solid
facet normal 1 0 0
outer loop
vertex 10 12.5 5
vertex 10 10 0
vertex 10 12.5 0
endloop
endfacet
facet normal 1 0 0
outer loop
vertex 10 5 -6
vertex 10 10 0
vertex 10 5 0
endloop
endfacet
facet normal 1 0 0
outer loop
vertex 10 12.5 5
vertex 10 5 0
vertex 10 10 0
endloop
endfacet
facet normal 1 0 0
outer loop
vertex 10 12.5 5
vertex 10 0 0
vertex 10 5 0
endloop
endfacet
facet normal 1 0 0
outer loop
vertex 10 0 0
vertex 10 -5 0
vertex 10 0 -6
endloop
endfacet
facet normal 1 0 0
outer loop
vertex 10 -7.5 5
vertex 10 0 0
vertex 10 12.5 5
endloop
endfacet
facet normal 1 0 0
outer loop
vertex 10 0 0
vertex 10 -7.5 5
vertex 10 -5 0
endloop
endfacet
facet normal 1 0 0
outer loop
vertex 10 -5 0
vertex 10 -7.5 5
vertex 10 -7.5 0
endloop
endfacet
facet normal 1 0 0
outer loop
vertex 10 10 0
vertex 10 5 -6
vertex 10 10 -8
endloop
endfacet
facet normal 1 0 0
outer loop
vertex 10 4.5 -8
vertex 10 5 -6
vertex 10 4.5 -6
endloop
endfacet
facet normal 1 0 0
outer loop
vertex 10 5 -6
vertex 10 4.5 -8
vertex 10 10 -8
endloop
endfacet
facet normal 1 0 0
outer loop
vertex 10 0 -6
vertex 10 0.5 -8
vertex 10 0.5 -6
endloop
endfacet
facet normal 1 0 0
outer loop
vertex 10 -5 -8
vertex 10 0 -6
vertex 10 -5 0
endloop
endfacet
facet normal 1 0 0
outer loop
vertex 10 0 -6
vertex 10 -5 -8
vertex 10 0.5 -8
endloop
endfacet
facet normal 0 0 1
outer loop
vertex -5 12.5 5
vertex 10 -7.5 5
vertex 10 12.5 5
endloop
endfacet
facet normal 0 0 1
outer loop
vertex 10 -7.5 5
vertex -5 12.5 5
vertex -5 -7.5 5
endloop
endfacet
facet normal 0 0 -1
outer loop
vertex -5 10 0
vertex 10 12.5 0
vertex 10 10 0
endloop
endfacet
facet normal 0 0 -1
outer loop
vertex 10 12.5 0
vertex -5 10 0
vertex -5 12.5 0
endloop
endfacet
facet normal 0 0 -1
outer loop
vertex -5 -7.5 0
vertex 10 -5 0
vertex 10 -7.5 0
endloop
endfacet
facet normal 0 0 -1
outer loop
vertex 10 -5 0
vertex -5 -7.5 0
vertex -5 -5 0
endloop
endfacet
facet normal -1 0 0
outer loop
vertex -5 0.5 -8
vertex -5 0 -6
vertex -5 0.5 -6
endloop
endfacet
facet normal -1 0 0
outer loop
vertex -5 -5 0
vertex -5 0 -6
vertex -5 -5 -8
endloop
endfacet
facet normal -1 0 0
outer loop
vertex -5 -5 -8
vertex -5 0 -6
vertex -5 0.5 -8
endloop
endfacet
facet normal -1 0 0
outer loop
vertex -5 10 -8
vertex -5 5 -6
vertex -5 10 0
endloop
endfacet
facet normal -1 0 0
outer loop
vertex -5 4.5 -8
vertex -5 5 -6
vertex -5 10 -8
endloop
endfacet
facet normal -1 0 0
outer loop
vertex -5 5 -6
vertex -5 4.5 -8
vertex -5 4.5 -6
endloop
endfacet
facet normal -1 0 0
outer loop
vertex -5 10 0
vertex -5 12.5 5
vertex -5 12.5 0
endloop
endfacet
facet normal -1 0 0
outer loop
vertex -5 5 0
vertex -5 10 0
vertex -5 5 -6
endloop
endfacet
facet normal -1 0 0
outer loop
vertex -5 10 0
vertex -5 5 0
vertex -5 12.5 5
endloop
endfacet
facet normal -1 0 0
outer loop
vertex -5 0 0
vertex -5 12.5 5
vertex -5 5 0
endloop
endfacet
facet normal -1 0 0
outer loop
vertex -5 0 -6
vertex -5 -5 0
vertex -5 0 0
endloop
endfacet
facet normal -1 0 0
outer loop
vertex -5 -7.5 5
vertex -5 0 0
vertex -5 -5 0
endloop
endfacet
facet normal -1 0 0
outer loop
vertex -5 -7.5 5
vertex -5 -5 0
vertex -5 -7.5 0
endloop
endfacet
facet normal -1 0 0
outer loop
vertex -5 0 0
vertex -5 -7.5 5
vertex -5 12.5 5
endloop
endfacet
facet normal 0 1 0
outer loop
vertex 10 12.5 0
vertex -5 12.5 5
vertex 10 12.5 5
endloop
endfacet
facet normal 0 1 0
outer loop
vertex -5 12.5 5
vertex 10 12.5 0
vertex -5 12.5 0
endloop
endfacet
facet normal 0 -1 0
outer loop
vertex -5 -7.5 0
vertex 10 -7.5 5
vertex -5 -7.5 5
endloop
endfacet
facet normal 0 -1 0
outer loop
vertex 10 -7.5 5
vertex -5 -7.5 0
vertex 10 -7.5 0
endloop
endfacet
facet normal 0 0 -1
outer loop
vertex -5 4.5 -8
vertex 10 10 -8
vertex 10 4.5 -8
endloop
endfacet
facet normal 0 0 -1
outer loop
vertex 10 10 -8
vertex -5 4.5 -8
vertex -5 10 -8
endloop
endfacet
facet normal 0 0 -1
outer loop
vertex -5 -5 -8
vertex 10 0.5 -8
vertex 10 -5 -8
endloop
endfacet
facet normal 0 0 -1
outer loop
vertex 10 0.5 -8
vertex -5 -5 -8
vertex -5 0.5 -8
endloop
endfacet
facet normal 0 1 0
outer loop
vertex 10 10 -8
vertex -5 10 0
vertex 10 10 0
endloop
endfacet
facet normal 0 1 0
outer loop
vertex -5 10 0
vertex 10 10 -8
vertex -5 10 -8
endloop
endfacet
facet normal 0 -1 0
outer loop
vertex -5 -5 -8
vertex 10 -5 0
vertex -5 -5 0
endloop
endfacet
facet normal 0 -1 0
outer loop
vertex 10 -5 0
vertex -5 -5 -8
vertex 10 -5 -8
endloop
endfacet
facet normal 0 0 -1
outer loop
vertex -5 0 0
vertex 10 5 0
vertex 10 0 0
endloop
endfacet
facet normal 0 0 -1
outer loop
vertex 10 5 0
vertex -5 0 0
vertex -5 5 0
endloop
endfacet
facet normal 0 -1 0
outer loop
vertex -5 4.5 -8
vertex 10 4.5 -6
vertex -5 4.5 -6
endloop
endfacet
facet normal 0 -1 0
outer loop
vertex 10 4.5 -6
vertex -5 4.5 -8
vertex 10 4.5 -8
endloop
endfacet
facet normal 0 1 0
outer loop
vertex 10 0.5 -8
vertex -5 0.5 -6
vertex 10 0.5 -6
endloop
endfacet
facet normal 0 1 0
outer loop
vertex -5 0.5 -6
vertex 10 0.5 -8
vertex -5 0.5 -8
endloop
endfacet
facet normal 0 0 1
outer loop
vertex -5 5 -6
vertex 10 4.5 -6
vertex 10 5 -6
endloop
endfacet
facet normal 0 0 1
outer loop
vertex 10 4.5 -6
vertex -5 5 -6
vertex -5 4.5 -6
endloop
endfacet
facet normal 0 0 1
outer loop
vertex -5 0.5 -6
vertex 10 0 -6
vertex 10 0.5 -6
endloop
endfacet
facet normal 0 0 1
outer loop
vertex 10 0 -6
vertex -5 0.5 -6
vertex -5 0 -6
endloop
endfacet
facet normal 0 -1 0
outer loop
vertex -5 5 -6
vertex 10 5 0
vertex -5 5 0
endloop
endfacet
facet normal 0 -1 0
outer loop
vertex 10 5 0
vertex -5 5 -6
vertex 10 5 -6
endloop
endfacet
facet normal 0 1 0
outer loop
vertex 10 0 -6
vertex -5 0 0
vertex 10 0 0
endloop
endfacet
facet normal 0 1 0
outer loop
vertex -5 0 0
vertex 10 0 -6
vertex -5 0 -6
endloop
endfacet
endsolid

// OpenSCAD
difference() {

union() {


	//base
	translate([-5,-7.5,0]) cube([15,20,5]);

	//frame clamp
	translate([-5,-5,-8]) cube([15,15,10]);	


}
	//clamp slots
	translate([-6,0.5,-9]) cube([60,4,9]);
	translate([-11,0,-6]) cube([60,5,6]);


}
